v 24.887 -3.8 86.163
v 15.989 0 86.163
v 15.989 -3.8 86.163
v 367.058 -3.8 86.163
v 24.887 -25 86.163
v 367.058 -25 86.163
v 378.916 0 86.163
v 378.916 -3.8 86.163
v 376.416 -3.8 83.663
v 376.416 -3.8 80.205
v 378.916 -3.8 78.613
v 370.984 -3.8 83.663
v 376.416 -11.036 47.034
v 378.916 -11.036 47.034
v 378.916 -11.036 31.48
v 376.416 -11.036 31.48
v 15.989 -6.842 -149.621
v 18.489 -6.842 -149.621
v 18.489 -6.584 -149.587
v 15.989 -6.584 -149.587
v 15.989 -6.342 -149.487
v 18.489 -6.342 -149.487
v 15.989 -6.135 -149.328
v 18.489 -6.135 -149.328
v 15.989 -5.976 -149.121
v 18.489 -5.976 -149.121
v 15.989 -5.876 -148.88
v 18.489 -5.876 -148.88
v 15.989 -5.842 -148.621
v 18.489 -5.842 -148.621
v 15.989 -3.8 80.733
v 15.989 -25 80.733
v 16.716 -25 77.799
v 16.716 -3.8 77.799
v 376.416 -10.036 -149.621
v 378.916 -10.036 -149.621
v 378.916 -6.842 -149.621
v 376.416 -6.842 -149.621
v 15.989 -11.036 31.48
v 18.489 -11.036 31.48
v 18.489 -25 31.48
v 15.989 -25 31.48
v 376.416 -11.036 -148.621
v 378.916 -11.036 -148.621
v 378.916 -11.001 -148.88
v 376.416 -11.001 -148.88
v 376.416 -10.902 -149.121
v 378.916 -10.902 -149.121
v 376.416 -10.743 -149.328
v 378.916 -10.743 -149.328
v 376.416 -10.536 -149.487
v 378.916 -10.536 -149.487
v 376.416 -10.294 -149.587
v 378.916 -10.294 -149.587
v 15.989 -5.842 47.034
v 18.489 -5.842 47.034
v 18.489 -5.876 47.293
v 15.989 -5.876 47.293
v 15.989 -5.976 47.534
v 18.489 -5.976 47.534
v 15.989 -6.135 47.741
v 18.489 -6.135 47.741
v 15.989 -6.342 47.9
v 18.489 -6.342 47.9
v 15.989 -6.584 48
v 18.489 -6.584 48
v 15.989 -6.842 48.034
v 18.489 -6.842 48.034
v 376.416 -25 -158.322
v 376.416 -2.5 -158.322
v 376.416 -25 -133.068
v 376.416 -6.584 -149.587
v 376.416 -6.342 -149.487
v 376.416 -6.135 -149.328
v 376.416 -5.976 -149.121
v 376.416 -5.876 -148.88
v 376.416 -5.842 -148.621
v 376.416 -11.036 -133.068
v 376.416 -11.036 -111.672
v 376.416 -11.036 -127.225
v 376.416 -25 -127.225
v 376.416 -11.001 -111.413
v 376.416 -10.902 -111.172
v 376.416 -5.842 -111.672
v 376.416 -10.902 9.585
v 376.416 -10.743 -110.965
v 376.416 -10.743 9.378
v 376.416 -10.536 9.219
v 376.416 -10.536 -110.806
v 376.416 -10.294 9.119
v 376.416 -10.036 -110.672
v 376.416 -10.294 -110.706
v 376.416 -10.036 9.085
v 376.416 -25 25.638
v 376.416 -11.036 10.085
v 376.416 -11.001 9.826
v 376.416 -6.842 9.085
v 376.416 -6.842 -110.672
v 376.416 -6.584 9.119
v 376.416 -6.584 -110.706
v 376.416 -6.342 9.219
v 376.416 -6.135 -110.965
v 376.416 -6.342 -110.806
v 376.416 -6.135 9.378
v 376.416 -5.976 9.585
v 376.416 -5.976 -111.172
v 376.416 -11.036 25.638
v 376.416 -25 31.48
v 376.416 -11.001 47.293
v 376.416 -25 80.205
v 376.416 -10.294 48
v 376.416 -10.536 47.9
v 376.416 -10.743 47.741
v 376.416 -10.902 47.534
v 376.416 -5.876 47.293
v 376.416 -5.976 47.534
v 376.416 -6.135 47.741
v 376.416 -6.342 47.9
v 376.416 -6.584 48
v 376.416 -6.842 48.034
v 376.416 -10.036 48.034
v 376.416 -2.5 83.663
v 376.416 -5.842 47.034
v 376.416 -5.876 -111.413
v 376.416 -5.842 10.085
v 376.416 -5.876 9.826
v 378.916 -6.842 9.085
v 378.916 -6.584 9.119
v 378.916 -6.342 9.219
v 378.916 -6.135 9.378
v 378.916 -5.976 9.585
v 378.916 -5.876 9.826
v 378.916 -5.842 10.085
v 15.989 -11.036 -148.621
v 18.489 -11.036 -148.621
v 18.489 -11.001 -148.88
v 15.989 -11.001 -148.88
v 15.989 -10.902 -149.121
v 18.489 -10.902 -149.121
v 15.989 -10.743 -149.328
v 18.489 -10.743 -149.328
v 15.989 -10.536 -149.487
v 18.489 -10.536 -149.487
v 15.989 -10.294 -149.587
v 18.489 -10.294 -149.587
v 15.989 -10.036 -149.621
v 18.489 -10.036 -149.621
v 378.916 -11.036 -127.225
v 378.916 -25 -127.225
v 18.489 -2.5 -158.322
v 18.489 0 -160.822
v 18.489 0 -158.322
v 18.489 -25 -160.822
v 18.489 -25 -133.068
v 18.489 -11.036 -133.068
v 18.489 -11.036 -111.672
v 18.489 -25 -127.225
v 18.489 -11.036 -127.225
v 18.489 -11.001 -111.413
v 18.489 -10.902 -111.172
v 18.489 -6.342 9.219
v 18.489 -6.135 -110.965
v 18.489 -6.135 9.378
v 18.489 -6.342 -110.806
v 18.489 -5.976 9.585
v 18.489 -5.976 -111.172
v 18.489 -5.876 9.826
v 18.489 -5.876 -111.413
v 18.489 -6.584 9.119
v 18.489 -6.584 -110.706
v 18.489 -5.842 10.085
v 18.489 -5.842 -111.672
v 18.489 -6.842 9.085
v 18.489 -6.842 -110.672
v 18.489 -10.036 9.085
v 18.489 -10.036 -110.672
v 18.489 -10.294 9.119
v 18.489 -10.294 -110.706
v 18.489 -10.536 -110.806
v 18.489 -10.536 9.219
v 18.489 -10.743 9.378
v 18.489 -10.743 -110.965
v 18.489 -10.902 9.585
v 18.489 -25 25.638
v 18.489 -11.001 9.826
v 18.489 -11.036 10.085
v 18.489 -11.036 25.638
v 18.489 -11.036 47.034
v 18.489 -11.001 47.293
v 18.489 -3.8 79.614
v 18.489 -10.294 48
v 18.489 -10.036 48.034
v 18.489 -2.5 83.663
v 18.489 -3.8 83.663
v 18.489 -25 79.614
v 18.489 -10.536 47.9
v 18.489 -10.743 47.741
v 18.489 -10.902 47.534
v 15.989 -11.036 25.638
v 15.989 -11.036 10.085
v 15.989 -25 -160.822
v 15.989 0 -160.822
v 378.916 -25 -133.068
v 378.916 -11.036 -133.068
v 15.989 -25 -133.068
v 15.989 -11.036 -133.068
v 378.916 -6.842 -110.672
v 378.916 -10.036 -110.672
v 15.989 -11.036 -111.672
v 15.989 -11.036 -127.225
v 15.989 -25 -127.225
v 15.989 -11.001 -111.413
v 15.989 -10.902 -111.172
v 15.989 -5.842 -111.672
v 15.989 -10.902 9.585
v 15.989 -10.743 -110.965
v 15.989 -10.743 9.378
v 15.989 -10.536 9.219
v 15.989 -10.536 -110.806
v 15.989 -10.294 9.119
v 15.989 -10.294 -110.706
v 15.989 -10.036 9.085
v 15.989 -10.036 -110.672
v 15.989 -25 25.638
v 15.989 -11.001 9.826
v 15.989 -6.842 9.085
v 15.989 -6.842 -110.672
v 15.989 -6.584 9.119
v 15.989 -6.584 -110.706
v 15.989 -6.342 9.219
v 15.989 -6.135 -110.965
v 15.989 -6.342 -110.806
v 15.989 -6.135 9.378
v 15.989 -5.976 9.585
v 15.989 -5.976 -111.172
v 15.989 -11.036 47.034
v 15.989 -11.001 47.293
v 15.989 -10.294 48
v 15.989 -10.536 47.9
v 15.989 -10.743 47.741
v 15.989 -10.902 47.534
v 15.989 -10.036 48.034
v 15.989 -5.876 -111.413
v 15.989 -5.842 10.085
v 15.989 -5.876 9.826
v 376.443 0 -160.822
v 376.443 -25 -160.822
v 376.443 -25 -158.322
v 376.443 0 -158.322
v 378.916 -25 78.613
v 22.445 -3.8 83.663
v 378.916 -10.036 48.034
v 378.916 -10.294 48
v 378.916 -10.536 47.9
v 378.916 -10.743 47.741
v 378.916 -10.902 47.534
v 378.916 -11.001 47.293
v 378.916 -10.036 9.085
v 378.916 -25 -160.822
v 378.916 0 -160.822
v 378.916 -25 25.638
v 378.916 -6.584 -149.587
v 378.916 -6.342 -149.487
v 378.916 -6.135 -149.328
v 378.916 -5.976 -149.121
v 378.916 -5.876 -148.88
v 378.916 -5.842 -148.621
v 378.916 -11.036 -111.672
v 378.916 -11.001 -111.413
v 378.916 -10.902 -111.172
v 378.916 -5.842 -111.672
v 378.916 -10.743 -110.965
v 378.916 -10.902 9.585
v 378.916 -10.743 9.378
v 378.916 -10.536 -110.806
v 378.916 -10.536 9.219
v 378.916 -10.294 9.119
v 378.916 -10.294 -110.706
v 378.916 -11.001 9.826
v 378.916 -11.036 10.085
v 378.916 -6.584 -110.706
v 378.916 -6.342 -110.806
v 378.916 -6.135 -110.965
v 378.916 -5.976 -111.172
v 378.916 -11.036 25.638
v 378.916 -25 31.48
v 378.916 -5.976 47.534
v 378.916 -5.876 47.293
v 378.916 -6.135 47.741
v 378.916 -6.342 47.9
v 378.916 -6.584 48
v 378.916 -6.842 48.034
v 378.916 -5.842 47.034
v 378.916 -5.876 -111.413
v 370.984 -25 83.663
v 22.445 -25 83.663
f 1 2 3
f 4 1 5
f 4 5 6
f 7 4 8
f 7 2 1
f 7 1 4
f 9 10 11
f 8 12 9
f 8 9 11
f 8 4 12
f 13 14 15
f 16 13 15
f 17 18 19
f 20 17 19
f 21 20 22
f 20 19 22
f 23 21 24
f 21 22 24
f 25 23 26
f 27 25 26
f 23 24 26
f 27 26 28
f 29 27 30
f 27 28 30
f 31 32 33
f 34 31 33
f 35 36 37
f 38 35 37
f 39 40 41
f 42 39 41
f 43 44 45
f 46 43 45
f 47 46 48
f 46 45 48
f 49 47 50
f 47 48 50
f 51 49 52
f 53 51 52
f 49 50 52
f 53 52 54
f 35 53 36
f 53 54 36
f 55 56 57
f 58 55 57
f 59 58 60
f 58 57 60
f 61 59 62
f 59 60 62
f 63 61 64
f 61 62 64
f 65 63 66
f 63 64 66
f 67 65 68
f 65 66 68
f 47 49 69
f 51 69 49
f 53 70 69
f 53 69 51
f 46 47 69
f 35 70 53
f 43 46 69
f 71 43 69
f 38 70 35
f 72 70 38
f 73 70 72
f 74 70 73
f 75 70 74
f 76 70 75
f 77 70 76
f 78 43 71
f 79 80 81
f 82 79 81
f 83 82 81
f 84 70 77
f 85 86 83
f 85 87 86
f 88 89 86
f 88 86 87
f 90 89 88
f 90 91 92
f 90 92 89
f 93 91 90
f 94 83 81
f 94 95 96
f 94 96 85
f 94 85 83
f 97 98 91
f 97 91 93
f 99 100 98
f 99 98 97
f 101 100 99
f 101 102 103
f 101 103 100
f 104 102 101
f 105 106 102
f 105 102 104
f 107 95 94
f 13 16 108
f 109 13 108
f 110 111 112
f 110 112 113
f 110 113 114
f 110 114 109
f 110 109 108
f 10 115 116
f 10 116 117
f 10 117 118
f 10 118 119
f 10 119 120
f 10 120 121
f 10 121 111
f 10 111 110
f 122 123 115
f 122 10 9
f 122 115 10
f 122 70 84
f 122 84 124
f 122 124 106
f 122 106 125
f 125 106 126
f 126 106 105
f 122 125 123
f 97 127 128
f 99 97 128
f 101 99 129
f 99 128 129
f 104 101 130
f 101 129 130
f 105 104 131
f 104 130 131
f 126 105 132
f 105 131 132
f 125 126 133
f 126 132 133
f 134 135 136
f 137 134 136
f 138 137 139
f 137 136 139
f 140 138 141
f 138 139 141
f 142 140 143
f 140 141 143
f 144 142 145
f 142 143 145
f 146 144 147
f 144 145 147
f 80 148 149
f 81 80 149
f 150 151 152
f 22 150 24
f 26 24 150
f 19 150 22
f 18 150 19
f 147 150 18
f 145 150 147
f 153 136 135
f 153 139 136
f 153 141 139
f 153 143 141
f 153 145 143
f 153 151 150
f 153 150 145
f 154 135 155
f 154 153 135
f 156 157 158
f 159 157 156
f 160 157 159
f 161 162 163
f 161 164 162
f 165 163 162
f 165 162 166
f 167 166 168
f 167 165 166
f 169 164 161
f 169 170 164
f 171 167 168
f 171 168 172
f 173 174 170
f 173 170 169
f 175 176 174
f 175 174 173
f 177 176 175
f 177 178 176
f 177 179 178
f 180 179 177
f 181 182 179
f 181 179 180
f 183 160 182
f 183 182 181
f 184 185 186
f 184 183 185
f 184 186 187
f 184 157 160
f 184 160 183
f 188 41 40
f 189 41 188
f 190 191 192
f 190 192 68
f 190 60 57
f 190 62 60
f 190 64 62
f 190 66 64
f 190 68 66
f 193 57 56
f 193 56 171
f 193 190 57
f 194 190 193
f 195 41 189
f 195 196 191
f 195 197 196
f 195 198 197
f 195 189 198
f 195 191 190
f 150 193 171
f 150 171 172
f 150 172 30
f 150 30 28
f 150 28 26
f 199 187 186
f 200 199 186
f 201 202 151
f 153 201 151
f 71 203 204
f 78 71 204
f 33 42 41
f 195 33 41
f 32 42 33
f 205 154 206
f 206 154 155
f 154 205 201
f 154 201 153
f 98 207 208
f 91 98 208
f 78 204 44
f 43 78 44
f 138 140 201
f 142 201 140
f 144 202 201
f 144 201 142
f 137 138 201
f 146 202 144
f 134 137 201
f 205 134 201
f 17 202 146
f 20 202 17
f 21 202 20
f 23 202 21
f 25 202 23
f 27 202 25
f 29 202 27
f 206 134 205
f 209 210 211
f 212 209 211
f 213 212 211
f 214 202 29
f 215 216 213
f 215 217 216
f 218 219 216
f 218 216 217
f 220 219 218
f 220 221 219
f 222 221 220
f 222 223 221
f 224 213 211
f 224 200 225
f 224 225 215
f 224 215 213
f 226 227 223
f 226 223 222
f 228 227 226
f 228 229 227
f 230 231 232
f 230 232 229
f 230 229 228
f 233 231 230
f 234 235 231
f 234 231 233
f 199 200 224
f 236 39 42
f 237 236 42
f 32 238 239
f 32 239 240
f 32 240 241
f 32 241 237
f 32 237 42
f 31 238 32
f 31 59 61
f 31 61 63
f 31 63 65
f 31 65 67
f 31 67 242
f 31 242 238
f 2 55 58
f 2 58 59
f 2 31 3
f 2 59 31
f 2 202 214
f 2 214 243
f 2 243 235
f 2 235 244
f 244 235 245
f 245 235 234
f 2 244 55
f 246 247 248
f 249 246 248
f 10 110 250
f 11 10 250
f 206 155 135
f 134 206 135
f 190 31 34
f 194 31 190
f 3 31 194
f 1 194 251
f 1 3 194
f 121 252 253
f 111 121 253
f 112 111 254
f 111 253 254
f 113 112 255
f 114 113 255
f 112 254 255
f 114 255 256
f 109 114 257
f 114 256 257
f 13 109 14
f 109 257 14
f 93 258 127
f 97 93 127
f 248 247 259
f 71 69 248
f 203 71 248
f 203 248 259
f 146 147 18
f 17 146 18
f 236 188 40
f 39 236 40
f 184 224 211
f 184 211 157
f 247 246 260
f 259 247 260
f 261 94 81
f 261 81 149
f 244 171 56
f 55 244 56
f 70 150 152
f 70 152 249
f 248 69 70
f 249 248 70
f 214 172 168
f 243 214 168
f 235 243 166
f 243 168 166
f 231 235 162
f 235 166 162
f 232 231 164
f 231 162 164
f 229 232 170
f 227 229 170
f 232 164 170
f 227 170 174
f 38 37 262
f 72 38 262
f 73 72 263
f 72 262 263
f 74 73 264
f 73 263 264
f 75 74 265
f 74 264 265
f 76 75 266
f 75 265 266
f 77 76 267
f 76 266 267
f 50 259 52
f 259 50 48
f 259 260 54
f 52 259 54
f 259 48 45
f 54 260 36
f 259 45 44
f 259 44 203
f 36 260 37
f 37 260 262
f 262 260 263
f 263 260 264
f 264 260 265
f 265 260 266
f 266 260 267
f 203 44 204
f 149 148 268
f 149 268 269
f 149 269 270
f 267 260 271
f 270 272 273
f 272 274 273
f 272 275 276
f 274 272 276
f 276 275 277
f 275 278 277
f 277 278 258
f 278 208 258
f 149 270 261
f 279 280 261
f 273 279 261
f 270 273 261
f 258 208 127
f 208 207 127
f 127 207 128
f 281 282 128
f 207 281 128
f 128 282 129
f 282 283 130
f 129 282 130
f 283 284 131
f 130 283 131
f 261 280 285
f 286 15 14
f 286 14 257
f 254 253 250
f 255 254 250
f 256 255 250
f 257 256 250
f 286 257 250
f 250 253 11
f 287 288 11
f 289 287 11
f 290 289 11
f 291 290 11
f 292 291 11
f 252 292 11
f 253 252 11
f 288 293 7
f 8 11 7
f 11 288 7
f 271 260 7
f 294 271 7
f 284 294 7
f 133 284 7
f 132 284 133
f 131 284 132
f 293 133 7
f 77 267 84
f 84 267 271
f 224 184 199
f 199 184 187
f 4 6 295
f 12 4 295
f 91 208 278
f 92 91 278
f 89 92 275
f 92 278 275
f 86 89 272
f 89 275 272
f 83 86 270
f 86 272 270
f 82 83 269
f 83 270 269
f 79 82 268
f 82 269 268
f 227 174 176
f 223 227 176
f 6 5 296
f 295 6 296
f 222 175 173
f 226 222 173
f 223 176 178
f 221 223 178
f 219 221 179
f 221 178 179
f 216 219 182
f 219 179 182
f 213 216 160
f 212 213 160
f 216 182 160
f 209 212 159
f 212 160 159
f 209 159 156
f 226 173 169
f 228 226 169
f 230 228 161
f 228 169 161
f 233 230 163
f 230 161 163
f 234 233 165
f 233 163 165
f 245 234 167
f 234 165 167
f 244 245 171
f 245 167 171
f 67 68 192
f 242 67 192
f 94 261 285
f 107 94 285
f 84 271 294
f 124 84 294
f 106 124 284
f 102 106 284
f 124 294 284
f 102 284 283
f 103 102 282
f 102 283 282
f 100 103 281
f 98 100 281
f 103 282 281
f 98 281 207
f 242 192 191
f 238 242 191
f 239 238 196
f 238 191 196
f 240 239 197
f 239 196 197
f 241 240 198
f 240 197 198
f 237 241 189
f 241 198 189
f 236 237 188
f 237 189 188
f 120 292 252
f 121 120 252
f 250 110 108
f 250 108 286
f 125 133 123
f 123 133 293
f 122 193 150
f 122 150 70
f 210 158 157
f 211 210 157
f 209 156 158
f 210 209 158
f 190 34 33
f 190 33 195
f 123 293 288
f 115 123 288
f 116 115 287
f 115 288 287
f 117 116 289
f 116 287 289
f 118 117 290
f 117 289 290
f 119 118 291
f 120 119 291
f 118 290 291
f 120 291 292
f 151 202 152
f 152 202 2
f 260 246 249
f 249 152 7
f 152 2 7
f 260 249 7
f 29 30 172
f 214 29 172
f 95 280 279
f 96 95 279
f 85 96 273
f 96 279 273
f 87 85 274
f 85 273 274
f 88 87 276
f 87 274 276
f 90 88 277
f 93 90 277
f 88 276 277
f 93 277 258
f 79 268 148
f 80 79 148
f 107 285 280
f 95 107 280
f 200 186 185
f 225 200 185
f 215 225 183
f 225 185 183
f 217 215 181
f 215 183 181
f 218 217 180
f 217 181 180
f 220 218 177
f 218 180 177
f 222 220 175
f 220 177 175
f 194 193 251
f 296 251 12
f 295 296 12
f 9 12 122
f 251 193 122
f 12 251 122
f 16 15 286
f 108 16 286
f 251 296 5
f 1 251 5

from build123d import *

# Parameters (mm, degrees)
F0_W     = 362.9276417196
F0_H     = 246.9854429364
F1_DEPTH = 25
F2_T     = -2.5
F3_W     = 357.9549430311
F3_H     = 45.3172796965
F4_DEPTH = 25
F6_DEPTH = 407
F8_DEPTH = 21.2


with BuildPart() as f1:
    # F0 (on Front) → F1 (new body)
    with BuildSketch(Plane.XZ):
        with Locations((197.4523235112, -37.3292528093)):
            Rectangle(F0_W, F0_H)
    extrude(amount=F1_DEPTH)

    # F2
    f2_openings = [f1.faces().sort_by_distance(p)[0] for p in [
        (197.452324, -25, -37.329253),
    ]]
    offset(amount=F2_T, openings=f2_openings)

    # F3 (on face) → F4 (cut)
    with BuildSketch(Plane.XZ.offset(25)):
        with Locations((197.465974167, -180.9806141257)):
            Rectangle(F3_W, F3_H)
    extrude(amount=-F4_DEPTH, mode=Mode.SUBTRACT)

    # F5 (on face) → F6 (cut)
    with BuildSketch(Plane.YZ.offset(378.916144371)):
        with BuildLine():
            Line((-11.0355205834, 31.4804576337), (-25, 31.4804576337))
            Line((-25, 31.4804576337), (-25, 25.6381239742))
            Line((-25, 25.6381239742), (-11.0355205834, 25.6381239742))
            Line((-11.0355205834, 25.6381239742), (-11.0355205834, 10.0848458931))
            ThreePointArc((-11.0355205834, 10.0848458931), (-10.7426273646, 9.3777391119), (-10.0355205834, 9.0848458931))
            Line((-10.0355205834, 9.0848458931), (-6.8423313312, 9.0848458931))
            ThreePointArc((-6.8423313312, 9.0848458931), (-6.13522455, 9.3777391119), (-5.8423313312, 10.0848458931))
            Line((-5.8423313312, 10.0848458931), (-5.8423313312, 47.0337403715))
            ThreePointArc((-5.8423313312, 47.0337403715), (-6.13522455, 47.7408471527), (-6.8423313312, 48.0337403715))
            Line((-6.8423313312, 48.0337403715), (-10.0355205834, 48.0337403715))
            ThreePointArc((-10.0355205834, 48.0337403715), (-10.7426273646, 47.7408471527), (-11.0355205834, 47.0337403715))
            Line((-11.0355205834, 47.0337403715), (-11.0355205834, 31.4804576337))
        make_face()
        with BuildLine():
            Line((-11.0355205834, -127.2254977375), (-25, -127.2254977375))
            Line((-25, -127.2254977375), (-25, -133.0678313971))
            Line((-25, -133.0678313971), (-11.0355205834, -133.0678313971))
            Line((-11.0355205834, -133.0678313971), (-11.0355205834, -148.6211094782))
            ThreePointArc((-11.0355205834, -148.6211094782), (-10.7426273646, -149.3282162594), (-10.0355205834, -149.6211094782))
            Line((-10.0355205834, -149.6211094782), (-6.8423313312, -149.6211094782))
            ThreePointArc((-6.8423313312, -149.6211094782), (-6.13522455, -149.3282162594), (-5.8423313312, -148.6211094782))
            Line((-5.8423313312, -148.6211094782), (-5.8423313312, -111.6722149998))
            ThreePointArc((-5.8423313312, -111.6722149998), (-6.13522455, -110.9651082186), (-6.8423313312, -110.6722149998))
            Line((-6.8423313312, -110.6722149998), (-10.0355205834, -110.6722149998))
            ThreePointArc((-10.0355205834, -110.6722149998), (-10.7426273646, -110.9651082186), (-11.0355205834, -111.6722149998))
            Line((-11.0355205834, -111.6722149998), (-11.0355205834, -127.2254977375))
        make_face()
    extrude(amount=-F6_DEPTH, mode=Mode.SUBTRACT)

    # F7 (on face) → F8 (cut)
    with BuildSketch(Plane.XZ.offset(25)):
        Polygon((367.0578853405, 86.1634686589), (370.9844340809, 83.6634686589), (376.416144371, 83.6634686589), (376.416144371, 80.2051451735), (378.916144371, 78.6134165555), (378.916144371, 86.1634686589), align=None)
        Polygon((15.9885026515, 80.7326063961), (16.7155197178, 77.799282968), (18.4885026515, 79.6139837289), (18.4885026515, 83.6634686589), (22.4448947056, 83.6634686589), (24.8874226582, 86.1634686589), (15.9885026515, 86.1634686589), align=None)
    extrude(amount=-F8_DEPTH, mode=Mode.SUBTRACT)


solid = f1.part
